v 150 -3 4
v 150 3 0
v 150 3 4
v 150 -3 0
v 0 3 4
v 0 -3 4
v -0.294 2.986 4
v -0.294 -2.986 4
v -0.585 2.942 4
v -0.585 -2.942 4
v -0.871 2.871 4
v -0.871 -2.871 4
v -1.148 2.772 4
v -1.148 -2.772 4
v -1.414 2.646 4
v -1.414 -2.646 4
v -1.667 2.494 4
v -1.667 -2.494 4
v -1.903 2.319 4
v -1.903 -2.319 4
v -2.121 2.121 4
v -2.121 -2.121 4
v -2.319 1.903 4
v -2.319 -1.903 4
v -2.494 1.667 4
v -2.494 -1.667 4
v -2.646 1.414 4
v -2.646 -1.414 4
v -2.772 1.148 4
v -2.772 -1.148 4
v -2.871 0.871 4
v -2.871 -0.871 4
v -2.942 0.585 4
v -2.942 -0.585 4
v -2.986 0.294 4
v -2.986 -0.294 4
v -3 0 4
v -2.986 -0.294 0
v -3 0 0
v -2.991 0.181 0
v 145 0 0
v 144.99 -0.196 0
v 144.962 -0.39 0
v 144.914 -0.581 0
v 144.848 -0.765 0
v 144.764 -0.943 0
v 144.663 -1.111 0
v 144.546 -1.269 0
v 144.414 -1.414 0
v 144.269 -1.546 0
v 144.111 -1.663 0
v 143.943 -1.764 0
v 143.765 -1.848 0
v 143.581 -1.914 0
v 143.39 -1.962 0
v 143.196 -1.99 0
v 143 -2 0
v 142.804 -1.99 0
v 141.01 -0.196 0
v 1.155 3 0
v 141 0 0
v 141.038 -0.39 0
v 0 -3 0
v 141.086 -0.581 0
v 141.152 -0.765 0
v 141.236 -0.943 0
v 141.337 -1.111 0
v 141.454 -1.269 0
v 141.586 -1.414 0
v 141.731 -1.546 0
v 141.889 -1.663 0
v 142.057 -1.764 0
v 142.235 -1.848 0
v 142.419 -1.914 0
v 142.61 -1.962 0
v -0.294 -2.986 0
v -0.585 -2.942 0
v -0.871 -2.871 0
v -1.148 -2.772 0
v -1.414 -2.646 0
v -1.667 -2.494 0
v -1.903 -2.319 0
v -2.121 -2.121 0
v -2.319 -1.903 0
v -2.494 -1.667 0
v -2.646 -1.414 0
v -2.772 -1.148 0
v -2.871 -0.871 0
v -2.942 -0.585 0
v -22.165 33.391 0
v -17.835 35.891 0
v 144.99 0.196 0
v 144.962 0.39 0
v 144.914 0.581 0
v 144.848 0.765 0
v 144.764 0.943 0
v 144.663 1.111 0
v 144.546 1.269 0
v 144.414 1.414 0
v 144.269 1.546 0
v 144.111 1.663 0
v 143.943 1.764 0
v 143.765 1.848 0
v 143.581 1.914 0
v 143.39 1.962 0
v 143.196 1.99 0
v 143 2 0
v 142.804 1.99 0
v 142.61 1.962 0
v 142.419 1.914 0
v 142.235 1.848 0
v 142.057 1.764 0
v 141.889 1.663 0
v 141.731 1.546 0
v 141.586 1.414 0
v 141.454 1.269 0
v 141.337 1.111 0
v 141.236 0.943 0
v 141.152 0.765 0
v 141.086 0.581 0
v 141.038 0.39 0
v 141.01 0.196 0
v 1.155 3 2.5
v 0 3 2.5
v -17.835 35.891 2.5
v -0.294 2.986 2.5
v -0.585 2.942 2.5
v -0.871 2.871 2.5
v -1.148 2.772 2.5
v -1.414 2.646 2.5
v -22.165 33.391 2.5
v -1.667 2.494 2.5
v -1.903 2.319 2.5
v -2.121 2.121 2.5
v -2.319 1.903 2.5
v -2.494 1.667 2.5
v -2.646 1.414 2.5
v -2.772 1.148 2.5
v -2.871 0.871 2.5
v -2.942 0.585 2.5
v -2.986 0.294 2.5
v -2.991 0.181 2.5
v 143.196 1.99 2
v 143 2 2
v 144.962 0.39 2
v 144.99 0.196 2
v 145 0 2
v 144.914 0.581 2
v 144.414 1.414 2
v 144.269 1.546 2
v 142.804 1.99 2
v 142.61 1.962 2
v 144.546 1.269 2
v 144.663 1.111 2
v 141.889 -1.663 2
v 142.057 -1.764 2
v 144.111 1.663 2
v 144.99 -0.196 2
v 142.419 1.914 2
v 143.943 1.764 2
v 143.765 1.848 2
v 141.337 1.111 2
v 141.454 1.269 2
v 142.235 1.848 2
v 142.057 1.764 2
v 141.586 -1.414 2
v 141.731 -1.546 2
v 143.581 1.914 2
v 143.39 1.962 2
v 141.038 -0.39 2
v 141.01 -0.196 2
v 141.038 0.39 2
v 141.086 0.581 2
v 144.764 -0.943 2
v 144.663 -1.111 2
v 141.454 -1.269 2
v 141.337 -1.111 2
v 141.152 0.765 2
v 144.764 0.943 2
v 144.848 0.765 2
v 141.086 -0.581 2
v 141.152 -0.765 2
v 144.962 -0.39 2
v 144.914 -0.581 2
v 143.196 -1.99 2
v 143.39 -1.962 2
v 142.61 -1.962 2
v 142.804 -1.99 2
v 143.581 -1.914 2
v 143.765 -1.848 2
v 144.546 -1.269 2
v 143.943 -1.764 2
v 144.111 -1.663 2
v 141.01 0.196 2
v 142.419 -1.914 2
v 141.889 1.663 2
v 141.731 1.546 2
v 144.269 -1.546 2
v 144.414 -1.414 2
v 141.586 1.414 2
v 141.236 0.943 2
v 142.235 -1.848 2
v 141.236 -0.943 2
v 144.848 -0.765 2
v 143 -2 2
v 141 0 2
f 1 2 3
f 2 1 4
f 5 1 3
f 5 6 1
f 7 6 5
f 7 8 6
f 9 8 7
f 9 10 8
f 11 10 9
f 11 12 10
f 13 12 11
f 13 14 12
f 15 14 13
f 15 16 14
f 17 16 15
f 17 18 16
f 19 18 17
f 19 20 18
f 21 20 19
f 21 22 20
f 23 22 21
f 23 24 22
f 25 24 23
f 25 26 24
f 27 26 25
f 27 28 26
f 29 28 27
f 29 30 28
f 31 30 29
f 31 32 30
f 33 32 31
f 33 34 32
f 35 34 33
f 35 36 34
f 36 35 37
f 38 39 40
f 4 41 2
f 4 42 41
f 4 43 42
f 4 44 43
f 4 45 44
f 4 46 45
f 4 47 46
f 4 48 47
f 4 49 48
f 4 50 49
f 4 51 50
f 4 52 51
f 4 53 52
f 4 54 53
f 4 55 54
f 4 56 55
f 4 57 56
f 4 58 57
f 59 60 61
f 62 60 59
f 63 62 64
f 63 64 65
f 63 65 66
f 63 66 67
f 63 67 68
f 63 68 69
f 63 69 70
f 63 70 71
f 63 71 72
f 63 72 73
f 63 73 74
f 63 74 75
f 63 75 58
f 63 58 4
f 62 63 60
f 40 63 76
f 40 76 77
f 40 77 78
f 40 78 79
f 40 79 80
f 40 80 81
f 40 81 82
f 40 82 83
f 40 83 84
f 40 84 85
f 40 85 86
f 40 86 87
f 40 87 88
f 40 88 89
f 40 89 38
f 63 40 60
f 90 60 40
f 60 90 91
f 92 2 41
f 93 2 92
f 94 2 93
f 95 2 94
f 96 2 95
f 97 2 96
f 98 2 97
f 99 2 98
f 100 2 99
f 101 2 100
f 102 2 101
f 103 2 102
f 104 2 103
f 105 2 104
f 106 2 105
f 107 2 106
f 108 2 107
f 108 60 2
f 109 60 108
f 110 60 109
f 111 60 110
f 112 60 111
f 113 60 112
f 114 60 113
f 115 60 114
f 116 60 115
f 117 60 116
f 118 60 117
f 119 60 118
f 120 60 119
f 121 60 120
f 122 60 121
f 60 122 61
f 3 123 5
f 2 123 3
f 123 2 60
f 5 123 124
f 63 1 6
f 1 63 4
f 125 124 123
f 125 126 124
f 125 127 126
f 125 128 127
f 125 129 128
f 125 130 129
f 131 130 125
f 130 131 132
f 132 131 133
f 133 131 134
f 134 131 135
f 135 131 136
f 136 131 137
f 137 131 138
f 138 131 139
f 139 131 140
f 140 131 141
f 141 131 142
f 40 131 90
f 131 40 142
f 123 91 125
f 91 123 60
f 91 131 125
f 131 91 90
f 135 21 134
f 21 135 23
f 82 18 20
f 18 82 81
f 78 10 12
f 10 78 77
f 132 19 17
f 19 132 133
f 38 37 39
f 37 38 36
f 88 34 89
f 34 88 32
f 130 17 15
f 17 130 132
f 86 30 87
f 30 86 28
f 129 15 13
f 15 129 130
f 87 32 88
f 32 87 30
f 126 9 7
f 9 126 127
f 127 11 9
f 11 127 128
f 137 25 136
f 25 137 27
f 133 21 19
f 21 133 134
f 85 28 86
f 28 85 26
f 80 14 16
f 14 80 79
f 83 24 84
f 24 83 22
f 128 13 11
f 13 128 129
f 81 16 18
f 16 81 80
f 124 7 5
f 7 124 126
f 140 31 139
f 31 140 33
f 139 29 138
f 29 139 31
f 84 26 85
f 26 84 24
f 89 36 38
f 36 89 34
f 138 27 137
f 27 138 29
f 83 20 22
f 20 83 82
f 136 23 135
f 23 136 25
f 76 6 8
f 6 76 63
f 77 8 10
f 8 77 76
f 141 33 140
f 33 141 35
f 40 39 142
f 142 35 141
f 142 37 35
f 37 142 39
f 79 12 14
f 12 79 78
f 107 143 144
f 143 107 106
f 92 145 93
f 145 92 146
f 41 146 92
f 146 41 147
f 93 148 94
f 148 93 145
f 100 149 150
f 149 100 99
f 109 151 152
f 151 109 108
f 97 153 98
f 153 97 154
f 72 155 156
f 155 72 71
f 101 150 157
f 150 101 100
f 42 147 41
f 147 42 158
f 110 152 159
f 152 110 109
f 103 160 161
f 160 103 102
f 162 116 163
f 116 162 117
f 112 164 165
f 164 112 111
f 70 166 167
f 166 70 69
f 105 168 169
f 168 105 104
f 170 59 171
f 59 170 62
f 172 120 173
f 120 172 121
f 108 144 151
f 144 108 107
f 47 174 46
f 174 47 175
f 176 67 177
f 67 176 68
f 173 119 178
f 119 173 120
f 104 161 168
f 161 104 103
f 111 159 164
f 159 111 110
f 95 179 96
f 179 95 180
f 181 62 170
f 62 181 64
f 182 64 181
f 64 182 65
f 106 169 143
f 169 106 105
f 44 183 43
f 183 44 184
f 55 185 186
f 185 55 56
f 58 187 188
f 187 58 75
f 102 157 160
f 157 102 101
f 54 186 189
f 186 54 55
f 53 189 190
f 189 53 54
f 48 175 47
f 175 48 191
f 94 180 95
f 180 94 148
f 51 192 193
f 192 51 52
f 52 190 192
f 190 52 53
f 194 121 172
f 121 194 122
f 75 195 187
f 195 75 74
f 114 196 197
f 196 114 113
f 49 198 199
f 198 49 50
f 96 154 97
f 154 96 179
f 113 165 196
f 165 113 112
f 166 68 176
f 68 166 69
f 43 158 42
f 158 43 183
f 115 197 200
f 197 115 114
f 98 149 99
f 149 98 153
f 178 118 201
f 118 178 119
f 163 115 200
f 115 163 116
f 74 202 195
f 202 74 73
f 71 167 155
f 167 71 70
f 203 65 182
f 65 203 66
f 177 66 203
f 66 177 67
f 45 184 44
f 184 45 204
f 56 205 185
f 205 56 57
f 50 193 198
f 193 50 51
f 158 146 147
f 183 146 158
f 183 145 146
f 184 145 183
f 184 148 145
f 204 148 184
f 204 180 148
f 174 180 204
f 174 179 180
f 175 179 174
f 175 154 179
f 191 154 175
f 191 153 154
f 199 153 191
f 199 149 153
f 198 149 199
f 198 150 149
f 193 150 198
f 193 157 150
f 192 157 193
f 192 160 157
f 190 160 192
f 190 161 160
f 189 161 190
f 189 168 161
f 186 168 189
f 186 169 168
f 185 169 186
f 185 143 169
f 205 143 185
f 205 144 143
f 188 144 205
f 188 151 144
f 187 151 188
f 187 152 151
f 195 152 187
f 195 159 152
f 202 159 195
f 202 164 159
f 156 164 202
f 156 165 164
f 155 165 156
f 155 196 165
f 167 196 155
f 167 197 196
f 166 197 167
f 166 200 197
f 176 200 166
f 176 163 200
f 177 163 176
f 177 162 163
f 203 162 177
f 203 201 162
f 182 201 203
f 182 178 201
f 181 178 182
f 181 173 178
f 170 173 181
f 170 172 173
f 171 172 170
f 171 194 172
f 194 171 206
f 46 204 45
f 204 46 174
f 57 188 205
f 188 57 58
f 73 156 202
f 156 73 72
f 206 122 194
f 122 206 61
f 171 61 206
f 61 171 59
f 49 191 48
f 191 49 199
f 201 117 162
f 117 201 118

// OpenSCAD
// L-shaped (hockey-stick) cell spreader for bacterial plating.
// Corrected to match exact coordinate specifications.

// --- Dimensions ---
handle_l    = 150.0; // Length of the handle
handle_w    = 6.0;   // Width of the handle
handle_t    = 4.0;   // Thickness of the handle
foot_l      = 40.0;  // Length of the spreading foot
foot_w      = 5.0;   // Width of the spreading foot
foot_t      = 2.5;   // Thickness of the spreading foot
boss_d      = 6.0;   // Diameter of the joining boss
boss_h      = 4.0;   // Height of the joining boss
hole_d      = 4.0;   // Diameter of the hanging hole
angle_deg   = 120.0; // Angle between handle and foot (counter-clockwise from +X)

$fn = 64;

module spreader() {
    difference() {
        union() {
            // 1. The Handle
            // Specification: x = 0 to 150, y = -3 to 3, z = 0 to 4
            // We translate by [handle_l/2, 0, handle_t/2] to center it on Y and Z, 
            // and place the start at X=0.
            translate([handle_l / 2, 0, handle_t / 2])
                cube([handle_l, handle_w, handle_t], center = true);

            // 2. The Spreading Foot
            // Specification: 40mm long, 5mm wide, 2.5mm thick.
            // Center line starts at origin and points 120 deg CCW from +X.
            // We create the foot such that its end is at the origin, then rotate.
            // To make the "smooth bed side" (the bottom) at Z=0, we translate by foot_t/2.
            rotate([0, 0, angle_deg])
            translate([foot_l / 2, 0, foot_t / 2])
                cube([foot_l, foot_w, foot_t], center = true);

            // 3. The Boss
            // Specification: 6mm diameter, 4mm tall at the origin.
            // To ensure it sits on the bed, we place it from Z=0 to Z=4.
            translate([0, 0, boss_h / 2])
                cylinder(d = boss_d, h = boss_h, center = true);
        }

        // 4. The Hanging Hole
        // Specification: 4mm diameter through the handle at x = 143, y = 0.
        // We extend the cylinder in Z to ensure a clean cut.
        translate([143, 0, -1])
            cylinder(d = hole_d, h = handle_t + 2, center = true);
    }
}

// Render the part
spreader();
